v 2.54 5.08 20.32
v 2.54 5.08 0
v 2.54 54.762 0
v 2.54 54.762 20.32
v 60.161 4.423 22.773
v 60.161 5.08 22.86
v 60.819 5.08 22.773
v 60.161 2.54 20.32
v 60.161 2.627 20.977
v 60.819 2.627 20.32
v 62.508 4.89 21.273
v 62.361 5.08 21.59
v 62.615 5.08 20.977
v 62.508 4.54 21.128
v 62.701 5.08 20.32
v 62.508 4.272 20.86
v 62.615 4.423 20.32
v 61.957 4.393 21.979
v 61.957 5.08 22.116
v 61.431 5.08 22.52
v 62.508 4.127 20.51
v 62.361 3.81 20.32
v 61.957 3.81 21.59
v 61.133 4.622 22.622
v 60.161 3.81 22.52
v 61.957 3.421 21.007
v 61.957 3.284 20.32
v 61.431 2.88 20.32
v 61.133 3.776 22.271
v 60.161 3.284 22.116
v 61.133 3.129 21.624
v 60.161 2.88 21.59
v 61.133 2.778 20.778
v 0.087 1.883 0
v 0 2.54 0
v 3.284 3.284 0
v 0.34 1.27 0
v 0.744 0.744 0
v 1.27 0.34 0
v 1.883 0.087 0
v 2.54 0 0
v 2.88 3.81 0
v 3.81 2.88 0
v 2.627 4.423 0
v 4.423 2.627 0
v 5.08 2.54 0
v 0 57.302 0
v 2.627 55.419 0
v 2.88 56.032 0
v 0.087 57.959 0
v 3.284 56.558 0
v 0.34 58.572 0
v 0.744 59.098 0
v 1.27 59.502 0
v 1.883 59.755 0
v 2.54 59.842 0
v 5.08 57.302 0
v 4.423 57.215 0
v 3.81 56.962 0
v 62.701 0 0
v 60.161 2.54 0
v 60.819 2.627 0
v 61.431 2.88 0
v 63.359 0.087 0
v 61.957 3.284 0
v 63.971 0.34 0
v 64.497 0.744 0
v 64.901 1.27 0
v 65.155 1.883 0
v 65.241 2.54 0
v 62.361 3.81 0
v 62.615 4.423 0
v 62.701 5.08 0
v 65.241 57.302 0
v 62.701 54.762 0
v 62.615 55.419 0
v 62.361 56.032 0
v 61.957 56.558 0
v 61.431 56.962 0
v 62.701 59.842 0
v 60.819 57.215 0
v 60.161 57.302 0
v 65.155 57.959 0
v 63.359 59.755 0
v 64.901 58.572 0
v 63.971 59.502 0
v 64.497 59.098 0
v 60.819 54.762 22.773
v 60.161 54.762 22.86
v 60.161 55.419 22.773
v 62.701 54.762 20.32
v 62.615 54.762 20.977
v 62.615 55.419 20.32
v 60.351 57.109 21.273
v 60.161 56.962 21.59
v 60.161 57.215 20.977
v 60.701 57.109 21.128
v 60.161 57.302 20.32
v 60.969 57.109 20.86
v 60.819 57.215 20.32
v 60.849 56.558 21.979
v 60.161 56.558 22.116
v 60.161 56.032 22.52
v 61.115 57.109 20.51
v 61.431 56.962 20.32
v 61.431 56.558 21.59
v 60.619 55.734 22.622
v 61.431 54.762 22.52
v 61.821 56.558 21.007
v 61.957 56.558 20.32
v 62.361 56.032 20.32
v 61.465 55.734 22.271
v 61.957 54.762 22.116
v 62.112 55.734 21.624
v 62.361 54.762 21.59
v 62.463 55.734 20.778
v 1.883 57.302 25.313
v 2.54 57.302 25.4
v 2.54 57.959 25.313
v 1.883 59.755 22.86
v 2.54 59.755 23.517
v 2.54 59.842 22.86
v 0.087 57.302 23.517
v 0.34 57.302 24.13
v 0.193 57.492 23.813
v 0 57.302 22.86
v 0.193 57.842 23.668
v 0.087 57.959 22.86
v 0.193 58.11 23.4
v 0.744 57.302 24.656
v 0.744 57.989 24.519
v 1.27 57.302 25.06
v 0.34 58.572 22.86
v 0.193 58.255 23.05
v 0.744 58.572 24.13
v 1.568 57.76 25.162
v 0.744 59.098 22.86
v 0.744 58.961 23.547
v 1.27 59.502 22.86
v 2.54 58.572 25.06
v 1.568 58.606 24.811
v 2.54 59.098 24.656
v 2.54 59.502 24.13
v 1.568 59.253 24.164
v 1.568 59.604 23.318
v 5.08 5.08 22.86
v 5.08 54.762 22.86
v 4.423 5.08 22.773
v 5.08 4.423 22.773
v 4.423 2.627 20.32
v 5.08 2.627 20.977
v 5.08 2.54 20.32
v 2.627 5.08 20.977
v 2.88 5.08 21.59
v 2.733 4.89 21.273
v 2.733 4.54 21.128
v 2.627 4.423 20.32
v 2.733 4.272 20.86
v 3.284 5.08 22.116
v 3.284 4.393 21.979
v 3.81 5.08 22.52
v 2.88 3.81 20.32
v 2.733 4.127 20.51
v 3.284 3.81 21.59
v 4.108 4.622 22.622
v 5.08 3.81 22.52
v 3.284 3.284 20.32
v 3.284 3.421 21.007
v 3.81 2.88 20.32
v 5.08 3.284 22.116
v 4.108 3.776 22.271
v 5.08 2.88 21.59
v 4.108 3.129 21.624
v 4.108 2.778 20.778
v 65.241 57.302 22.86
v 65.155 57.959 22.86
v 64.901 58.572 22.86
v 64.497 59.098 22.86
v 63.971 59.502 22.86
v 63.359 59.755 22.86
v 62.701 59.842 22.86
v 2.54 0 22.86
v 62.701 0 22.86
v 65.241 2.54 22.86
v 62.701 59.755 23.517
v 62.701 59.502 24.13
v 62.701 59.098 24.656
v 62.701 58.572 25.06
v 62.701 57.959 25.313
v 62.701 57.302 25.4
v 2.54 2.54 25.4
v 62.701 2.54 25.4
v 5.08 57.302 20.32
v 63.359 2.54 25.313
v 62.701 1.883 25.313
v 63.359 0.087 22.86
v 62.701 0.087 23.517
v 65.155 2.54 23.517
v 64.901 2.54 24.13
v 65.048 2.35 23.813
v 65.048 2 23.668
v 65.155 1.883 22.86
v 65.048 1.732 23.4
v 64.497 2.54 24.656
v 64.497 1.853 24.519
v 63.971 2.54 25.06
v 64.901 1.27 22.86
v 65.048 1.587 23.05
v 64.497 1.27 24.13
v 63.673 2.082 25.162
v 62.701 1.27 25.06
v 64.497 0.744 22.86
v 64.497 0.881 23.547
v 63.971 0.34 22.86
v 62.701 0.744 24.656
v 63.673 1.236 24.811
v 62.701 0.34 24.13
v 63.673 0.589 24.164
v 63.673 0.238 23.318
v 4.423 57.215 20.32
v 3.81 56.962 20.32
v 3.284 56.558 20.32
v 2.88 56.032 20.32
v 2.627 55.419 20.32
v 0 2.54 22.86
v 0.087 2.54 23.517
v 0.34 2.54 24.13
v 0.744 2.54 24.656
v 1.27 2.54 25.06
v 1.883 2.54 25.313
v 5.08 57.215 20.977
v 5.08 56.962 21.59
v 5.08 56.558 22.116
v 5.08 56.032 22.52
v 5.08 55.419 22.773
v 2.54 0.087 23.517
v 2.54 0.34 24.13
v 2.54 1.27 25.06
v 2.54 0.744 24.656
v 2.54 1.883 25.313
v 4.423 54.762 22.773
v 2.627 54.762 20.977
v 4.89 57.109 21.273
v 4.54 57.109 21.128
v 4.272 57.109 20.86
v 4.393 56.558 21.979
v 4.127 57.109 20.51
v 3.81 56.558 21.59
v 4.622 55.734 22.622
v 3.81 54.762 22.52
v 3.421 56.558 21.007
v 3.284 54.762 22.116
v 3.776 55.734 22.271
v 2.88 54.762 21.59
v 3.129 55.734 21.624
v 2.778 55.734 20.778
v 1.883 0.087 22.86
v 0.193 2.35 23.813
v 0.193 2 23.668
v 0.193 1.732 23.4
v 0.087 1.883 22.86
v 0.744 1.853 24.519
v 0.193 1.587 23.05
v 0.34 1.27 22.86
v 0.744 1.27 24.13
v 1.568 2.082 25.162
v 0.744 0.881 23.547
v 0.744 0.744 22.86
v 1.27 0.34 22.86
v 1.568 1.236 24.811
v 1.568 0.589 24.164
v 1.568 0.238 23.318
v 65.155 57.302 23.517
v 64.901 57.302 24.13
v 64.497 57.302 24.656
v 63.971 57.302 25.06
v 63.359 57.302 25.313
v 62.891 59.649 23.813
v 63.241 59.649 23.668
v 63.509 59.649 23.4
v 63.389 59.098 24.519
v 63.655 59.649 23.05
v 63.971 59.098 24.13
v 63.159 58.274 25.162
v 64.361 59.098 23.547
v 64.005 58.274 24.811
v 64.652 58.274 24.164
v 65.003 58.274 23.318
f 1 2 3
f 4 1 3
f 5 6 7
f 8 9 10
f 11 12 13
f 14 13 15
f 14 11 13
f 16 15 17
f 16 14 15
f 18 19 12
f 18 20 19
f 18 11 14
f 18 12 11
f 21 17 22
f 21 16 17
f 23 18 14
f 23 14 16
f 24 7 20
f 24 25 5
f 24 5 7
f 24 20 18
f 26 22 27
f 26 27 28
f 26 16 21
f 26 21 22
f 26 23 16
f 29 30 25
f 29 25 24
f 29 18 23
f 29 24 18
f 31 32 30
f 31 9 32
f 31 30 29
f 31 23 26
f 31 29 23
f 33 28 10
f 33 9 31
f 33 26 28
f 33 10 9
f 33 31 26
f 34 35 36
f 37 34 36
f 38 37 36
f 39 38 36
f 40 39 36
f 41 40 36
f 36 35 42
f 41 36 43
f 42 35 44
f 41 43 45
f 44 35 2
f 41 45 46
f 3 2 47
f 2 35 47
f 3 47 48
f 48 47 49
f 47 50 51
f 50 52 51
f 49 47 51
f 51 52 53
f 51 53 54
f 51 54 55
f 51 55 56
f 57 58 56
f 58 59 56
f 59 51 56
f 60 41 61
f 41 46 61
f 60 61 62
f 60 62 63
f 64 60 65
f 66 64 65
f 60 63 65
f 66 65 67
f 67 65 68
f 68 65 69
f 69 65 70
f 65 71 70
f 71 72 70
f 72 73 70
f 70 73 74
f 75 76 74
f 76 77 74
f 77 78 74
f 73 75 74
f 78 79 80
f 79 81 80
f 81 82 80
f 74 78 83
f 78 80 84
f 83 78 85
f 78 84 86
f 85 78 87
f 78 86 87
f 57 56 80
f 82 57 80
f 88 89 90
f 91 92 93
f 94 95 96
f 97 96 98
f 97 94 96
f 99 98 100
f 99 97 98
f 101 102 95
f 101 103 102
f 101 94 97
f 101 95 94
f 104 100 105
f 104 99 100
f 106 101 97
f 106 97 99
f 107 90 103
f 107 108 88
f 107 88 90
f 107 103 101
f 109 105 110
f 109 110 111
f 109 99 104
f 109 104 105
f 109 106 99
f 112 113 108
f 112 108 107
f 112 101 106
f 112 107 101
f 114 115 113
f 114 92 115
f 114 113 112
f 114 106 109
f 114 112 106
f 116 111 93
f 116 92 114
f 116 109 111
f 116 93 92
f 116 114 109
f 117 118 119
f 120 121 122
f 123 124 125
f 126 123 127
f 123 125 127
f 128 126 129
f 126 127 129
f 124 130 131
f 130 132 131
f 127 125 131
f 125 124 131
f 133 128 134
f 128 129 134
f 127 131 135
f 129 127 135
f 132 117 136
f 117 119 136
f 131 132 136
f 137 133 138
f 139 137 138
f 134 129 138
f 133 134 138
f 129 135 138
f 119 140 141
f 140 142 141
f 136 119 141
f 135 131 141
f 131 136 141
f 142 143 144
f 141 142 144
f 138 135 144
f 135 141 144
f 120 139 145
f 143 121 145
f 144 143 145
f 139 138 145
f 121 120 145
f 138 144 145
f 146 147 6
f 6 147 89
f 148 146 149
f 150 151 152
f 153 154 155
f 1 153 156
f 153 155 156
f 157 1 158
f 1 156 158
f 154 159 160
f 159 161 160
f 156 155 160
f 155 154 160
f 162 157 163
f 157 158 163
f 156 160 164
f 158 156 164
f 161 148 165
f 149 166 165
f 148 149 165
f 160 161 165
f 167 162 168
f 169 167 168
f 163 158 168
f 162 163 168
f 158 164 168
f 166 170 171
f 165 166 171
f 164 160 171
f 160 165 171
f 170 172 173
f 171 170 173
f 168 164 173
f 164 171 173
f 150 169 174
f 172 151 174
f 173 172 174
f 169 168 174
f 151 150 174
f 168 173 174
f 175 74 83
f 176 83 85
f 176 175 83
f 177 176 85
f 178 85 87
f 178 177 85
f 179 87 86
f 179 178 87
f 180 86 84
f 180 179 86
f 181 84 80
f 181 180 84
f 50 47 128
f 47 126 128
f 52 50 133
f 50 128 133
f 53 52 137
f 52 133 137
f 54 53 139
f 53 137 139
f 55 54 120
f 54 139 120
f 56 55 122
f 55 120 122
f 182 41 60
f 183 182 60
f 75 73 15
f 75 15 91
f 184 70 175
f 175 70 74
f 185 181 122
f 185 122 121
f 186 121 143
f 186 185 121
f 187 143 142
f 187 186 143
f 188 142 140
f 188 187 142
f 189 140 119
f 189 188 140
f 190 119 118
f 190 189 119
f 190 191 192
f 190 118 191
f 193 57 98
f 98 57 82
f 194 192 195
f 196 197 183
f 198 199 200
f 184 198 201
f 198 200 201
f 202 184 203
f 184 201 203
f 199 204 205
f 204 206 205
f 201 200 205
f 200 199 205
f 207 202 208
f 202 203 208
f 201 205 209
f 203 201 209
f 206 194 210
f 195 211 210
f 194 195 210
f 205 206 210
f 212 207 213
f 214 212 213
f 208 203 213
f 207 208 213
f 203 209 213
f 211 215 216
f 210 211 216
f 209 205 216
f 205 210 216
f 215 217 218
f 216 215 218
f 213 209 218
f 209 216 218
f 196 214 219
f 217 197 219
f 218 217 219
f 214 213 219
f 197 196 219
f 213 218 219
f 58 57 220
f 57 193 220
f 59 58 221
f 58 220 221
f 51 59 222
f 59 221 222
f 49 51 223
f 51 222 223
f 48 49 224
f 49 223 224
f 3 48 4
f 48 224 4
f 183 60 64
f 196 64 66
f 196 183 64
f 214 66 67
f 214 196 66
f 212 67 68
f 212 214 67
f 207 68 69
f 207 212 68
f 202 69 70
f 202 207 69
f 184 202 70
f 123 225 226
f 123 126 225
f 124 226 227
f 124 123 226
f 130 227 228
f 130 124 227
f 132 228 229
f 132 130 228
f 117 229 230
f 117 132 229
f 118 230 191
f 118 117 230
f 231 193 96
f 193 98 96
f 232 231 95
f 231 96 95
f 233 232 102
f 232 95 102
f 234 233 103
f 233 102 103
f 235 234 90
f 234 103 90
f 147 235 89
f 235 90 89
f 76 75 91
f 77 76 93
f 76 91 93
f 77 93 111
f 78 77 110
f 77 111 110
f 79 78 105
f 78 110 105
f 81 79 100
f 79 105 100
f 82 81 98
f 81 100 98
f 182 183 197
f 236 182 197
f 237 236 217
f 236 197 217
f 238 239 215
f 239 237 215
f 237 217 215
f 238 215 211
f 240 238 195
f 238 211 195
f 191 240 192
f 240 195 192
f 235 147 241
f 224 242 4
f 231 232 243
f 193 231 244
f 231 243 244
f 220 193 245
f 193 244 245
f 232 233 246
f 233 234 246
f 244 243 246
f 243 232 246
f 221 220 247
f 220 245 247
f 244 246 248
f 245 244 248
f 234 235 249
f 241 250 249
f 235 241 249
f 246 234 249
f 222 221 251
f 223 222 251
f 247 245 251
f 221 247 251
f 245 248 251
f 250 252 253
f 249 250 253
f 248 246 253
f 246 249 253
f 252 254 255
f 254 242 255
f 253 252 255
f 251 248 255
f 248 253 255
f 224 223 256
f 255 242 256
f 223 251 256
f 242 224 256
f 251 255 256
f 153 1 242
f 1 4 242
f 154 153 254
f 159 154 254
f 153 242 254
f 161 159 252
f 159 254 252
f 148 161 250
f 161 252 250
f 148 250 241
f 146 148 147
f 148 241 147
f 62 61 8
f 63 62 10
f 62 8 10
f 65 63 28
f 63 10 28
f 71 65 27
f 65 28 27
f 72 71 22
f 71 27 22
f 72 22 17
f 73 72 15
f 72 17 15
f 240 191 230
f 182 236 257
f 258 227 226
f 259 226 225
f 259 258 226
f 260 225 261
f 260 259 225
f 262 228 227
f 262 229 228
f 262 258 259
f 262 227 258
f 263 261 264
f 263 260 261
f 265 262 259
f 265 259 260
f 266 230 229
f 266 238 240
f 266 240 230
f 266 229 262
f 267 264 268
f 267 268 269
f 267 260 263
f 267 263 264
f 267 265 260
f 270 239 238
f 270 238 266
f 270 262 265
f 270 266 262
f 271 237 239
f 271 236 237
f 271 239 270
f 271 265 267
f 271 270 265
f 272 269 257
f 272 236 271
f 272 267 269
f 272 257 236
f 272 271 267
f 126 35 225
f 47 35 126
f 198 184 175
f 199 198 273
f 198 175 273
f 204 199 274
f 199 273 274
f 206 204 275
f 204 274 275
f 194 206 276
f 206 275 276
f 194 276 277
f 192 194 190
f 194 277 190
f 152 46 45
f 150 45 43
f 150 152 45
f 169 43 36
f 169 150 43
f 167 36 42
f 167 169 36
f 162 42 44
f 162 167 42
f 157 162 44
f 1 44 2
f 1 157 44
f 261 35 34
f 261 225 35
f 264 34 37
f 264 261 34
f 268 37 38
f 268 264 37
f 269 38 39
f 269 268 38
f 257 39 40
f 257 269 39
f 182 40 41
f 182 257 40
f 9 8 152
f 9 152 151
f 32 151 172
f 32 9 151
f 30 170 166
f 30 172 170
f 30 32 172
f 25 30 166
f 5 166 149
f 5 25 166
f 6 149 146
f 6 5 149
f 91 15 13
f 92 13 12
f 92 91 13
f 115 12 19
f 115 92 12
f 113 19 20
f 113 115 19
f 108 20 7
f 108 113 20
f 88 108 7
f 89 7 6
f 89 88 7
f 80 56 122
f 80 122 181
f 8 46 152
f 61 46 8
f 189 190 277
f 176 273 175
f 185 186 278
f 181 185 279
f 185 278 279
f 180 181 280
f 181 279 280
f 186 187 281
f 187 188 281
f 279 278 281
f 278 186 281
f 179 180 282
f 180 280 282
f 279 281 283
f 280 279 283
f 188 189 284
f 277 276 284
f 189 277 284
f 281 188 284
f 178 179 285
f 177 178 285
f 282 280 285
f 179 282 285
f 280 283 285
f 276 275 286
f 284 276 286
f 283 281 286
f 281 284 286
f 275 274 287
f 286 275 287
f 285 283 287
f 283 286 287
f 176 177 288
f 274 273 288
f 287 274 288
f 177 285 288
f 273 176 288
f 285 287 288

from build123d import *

# Parameters (mm, degrees)
F0_W     = 65.2412325144
F0_H     = 59.8419681191
F1_DEPTH = 25.4
F2_R     = 2.54
F3_T     = 2.54
F4_R     = 2.54


# Not quite as in the source:
# - a shell that OpenCascade refuses in one call is made with other operations: the cavity is built on its own and cut out


with BuildPart() as f1:
    # F0 (on Top) → F1 (new body)
    with BuildSketch(Plane.XY):
        with Locations((32.6206162572, 29.9209840596)):
            Rectangle(F0_W, F0_H)
    extrude(amount=F1_DEPTH)

    # F2
    f2_edges = [f1.edges().sort_by_distance(p)[0] for p in [
        (32.620616, 0, 25.4),
        (65.241233, 29.920984, 25.4),
        (32.620616, 59.841968, 25.4),
        (0, 29.920984, 25.4),
        (65.241233, 0, 12.7),
        (0, 0, 12.7),
        (65.241233, 59.841968, 12.7),
        (0, 59.841968, 12.7),
    ]]
    fillet(f2_edges, radius=F2_R)

    # F3: shell of thickness 2.54, made by hand


with BuildPart() as f3_core1:
    # F3_t2: copy of F1
    add(f1.part)

    # the walls: a layer under each face that stays
    f3_faces = [f3_core1.faces().sort_by_distance(p)[0] for p in [
        (0, 29.9209840596, 11.43),
        (32.6206162572, 59.8419681191, 11.43),
        (32.6206162572, 0, 11.43),
        (65.2412325144, 29.9209840596, 11.43),
        (32.6206162572, 29.9209840596, 25.4),
    ]]
    thicken(f3_faces, amount=-F3_T, mode=Mode.SUBTRACT)


with BuildPart() as f1_1:
    add(f1.part)

    # what is left inside the walls is the cavity
    f3_cavity = [f3_core1.part.solids().sort_by_distance(p)[0] for p in [
        (32.620616, 20.793989, 0.0254),
    ]]
    add(f3_cavity, mode=Mode.SUBTRACT)

    # F4
    f4_edges = [f1_1.edges().sort_by_distance(p)[0] for p in [
        (32.620616, 2.54, 22.86),
        (2.54, 29.920984, 22.86),
        (62.701233, 29.920984, 22.86),
        (32.620616, 57.301968, 22.86),
        (62.701233, 57.301968, 11.43),
        (2.54, 57.301968, 11.43),
        (2.54, 2.54, 11.43),
        (62.701233, 2.54, 11.43),
    ]]
    fillet(f4_edges, radius=F4_R)


solid = f1_1.part
